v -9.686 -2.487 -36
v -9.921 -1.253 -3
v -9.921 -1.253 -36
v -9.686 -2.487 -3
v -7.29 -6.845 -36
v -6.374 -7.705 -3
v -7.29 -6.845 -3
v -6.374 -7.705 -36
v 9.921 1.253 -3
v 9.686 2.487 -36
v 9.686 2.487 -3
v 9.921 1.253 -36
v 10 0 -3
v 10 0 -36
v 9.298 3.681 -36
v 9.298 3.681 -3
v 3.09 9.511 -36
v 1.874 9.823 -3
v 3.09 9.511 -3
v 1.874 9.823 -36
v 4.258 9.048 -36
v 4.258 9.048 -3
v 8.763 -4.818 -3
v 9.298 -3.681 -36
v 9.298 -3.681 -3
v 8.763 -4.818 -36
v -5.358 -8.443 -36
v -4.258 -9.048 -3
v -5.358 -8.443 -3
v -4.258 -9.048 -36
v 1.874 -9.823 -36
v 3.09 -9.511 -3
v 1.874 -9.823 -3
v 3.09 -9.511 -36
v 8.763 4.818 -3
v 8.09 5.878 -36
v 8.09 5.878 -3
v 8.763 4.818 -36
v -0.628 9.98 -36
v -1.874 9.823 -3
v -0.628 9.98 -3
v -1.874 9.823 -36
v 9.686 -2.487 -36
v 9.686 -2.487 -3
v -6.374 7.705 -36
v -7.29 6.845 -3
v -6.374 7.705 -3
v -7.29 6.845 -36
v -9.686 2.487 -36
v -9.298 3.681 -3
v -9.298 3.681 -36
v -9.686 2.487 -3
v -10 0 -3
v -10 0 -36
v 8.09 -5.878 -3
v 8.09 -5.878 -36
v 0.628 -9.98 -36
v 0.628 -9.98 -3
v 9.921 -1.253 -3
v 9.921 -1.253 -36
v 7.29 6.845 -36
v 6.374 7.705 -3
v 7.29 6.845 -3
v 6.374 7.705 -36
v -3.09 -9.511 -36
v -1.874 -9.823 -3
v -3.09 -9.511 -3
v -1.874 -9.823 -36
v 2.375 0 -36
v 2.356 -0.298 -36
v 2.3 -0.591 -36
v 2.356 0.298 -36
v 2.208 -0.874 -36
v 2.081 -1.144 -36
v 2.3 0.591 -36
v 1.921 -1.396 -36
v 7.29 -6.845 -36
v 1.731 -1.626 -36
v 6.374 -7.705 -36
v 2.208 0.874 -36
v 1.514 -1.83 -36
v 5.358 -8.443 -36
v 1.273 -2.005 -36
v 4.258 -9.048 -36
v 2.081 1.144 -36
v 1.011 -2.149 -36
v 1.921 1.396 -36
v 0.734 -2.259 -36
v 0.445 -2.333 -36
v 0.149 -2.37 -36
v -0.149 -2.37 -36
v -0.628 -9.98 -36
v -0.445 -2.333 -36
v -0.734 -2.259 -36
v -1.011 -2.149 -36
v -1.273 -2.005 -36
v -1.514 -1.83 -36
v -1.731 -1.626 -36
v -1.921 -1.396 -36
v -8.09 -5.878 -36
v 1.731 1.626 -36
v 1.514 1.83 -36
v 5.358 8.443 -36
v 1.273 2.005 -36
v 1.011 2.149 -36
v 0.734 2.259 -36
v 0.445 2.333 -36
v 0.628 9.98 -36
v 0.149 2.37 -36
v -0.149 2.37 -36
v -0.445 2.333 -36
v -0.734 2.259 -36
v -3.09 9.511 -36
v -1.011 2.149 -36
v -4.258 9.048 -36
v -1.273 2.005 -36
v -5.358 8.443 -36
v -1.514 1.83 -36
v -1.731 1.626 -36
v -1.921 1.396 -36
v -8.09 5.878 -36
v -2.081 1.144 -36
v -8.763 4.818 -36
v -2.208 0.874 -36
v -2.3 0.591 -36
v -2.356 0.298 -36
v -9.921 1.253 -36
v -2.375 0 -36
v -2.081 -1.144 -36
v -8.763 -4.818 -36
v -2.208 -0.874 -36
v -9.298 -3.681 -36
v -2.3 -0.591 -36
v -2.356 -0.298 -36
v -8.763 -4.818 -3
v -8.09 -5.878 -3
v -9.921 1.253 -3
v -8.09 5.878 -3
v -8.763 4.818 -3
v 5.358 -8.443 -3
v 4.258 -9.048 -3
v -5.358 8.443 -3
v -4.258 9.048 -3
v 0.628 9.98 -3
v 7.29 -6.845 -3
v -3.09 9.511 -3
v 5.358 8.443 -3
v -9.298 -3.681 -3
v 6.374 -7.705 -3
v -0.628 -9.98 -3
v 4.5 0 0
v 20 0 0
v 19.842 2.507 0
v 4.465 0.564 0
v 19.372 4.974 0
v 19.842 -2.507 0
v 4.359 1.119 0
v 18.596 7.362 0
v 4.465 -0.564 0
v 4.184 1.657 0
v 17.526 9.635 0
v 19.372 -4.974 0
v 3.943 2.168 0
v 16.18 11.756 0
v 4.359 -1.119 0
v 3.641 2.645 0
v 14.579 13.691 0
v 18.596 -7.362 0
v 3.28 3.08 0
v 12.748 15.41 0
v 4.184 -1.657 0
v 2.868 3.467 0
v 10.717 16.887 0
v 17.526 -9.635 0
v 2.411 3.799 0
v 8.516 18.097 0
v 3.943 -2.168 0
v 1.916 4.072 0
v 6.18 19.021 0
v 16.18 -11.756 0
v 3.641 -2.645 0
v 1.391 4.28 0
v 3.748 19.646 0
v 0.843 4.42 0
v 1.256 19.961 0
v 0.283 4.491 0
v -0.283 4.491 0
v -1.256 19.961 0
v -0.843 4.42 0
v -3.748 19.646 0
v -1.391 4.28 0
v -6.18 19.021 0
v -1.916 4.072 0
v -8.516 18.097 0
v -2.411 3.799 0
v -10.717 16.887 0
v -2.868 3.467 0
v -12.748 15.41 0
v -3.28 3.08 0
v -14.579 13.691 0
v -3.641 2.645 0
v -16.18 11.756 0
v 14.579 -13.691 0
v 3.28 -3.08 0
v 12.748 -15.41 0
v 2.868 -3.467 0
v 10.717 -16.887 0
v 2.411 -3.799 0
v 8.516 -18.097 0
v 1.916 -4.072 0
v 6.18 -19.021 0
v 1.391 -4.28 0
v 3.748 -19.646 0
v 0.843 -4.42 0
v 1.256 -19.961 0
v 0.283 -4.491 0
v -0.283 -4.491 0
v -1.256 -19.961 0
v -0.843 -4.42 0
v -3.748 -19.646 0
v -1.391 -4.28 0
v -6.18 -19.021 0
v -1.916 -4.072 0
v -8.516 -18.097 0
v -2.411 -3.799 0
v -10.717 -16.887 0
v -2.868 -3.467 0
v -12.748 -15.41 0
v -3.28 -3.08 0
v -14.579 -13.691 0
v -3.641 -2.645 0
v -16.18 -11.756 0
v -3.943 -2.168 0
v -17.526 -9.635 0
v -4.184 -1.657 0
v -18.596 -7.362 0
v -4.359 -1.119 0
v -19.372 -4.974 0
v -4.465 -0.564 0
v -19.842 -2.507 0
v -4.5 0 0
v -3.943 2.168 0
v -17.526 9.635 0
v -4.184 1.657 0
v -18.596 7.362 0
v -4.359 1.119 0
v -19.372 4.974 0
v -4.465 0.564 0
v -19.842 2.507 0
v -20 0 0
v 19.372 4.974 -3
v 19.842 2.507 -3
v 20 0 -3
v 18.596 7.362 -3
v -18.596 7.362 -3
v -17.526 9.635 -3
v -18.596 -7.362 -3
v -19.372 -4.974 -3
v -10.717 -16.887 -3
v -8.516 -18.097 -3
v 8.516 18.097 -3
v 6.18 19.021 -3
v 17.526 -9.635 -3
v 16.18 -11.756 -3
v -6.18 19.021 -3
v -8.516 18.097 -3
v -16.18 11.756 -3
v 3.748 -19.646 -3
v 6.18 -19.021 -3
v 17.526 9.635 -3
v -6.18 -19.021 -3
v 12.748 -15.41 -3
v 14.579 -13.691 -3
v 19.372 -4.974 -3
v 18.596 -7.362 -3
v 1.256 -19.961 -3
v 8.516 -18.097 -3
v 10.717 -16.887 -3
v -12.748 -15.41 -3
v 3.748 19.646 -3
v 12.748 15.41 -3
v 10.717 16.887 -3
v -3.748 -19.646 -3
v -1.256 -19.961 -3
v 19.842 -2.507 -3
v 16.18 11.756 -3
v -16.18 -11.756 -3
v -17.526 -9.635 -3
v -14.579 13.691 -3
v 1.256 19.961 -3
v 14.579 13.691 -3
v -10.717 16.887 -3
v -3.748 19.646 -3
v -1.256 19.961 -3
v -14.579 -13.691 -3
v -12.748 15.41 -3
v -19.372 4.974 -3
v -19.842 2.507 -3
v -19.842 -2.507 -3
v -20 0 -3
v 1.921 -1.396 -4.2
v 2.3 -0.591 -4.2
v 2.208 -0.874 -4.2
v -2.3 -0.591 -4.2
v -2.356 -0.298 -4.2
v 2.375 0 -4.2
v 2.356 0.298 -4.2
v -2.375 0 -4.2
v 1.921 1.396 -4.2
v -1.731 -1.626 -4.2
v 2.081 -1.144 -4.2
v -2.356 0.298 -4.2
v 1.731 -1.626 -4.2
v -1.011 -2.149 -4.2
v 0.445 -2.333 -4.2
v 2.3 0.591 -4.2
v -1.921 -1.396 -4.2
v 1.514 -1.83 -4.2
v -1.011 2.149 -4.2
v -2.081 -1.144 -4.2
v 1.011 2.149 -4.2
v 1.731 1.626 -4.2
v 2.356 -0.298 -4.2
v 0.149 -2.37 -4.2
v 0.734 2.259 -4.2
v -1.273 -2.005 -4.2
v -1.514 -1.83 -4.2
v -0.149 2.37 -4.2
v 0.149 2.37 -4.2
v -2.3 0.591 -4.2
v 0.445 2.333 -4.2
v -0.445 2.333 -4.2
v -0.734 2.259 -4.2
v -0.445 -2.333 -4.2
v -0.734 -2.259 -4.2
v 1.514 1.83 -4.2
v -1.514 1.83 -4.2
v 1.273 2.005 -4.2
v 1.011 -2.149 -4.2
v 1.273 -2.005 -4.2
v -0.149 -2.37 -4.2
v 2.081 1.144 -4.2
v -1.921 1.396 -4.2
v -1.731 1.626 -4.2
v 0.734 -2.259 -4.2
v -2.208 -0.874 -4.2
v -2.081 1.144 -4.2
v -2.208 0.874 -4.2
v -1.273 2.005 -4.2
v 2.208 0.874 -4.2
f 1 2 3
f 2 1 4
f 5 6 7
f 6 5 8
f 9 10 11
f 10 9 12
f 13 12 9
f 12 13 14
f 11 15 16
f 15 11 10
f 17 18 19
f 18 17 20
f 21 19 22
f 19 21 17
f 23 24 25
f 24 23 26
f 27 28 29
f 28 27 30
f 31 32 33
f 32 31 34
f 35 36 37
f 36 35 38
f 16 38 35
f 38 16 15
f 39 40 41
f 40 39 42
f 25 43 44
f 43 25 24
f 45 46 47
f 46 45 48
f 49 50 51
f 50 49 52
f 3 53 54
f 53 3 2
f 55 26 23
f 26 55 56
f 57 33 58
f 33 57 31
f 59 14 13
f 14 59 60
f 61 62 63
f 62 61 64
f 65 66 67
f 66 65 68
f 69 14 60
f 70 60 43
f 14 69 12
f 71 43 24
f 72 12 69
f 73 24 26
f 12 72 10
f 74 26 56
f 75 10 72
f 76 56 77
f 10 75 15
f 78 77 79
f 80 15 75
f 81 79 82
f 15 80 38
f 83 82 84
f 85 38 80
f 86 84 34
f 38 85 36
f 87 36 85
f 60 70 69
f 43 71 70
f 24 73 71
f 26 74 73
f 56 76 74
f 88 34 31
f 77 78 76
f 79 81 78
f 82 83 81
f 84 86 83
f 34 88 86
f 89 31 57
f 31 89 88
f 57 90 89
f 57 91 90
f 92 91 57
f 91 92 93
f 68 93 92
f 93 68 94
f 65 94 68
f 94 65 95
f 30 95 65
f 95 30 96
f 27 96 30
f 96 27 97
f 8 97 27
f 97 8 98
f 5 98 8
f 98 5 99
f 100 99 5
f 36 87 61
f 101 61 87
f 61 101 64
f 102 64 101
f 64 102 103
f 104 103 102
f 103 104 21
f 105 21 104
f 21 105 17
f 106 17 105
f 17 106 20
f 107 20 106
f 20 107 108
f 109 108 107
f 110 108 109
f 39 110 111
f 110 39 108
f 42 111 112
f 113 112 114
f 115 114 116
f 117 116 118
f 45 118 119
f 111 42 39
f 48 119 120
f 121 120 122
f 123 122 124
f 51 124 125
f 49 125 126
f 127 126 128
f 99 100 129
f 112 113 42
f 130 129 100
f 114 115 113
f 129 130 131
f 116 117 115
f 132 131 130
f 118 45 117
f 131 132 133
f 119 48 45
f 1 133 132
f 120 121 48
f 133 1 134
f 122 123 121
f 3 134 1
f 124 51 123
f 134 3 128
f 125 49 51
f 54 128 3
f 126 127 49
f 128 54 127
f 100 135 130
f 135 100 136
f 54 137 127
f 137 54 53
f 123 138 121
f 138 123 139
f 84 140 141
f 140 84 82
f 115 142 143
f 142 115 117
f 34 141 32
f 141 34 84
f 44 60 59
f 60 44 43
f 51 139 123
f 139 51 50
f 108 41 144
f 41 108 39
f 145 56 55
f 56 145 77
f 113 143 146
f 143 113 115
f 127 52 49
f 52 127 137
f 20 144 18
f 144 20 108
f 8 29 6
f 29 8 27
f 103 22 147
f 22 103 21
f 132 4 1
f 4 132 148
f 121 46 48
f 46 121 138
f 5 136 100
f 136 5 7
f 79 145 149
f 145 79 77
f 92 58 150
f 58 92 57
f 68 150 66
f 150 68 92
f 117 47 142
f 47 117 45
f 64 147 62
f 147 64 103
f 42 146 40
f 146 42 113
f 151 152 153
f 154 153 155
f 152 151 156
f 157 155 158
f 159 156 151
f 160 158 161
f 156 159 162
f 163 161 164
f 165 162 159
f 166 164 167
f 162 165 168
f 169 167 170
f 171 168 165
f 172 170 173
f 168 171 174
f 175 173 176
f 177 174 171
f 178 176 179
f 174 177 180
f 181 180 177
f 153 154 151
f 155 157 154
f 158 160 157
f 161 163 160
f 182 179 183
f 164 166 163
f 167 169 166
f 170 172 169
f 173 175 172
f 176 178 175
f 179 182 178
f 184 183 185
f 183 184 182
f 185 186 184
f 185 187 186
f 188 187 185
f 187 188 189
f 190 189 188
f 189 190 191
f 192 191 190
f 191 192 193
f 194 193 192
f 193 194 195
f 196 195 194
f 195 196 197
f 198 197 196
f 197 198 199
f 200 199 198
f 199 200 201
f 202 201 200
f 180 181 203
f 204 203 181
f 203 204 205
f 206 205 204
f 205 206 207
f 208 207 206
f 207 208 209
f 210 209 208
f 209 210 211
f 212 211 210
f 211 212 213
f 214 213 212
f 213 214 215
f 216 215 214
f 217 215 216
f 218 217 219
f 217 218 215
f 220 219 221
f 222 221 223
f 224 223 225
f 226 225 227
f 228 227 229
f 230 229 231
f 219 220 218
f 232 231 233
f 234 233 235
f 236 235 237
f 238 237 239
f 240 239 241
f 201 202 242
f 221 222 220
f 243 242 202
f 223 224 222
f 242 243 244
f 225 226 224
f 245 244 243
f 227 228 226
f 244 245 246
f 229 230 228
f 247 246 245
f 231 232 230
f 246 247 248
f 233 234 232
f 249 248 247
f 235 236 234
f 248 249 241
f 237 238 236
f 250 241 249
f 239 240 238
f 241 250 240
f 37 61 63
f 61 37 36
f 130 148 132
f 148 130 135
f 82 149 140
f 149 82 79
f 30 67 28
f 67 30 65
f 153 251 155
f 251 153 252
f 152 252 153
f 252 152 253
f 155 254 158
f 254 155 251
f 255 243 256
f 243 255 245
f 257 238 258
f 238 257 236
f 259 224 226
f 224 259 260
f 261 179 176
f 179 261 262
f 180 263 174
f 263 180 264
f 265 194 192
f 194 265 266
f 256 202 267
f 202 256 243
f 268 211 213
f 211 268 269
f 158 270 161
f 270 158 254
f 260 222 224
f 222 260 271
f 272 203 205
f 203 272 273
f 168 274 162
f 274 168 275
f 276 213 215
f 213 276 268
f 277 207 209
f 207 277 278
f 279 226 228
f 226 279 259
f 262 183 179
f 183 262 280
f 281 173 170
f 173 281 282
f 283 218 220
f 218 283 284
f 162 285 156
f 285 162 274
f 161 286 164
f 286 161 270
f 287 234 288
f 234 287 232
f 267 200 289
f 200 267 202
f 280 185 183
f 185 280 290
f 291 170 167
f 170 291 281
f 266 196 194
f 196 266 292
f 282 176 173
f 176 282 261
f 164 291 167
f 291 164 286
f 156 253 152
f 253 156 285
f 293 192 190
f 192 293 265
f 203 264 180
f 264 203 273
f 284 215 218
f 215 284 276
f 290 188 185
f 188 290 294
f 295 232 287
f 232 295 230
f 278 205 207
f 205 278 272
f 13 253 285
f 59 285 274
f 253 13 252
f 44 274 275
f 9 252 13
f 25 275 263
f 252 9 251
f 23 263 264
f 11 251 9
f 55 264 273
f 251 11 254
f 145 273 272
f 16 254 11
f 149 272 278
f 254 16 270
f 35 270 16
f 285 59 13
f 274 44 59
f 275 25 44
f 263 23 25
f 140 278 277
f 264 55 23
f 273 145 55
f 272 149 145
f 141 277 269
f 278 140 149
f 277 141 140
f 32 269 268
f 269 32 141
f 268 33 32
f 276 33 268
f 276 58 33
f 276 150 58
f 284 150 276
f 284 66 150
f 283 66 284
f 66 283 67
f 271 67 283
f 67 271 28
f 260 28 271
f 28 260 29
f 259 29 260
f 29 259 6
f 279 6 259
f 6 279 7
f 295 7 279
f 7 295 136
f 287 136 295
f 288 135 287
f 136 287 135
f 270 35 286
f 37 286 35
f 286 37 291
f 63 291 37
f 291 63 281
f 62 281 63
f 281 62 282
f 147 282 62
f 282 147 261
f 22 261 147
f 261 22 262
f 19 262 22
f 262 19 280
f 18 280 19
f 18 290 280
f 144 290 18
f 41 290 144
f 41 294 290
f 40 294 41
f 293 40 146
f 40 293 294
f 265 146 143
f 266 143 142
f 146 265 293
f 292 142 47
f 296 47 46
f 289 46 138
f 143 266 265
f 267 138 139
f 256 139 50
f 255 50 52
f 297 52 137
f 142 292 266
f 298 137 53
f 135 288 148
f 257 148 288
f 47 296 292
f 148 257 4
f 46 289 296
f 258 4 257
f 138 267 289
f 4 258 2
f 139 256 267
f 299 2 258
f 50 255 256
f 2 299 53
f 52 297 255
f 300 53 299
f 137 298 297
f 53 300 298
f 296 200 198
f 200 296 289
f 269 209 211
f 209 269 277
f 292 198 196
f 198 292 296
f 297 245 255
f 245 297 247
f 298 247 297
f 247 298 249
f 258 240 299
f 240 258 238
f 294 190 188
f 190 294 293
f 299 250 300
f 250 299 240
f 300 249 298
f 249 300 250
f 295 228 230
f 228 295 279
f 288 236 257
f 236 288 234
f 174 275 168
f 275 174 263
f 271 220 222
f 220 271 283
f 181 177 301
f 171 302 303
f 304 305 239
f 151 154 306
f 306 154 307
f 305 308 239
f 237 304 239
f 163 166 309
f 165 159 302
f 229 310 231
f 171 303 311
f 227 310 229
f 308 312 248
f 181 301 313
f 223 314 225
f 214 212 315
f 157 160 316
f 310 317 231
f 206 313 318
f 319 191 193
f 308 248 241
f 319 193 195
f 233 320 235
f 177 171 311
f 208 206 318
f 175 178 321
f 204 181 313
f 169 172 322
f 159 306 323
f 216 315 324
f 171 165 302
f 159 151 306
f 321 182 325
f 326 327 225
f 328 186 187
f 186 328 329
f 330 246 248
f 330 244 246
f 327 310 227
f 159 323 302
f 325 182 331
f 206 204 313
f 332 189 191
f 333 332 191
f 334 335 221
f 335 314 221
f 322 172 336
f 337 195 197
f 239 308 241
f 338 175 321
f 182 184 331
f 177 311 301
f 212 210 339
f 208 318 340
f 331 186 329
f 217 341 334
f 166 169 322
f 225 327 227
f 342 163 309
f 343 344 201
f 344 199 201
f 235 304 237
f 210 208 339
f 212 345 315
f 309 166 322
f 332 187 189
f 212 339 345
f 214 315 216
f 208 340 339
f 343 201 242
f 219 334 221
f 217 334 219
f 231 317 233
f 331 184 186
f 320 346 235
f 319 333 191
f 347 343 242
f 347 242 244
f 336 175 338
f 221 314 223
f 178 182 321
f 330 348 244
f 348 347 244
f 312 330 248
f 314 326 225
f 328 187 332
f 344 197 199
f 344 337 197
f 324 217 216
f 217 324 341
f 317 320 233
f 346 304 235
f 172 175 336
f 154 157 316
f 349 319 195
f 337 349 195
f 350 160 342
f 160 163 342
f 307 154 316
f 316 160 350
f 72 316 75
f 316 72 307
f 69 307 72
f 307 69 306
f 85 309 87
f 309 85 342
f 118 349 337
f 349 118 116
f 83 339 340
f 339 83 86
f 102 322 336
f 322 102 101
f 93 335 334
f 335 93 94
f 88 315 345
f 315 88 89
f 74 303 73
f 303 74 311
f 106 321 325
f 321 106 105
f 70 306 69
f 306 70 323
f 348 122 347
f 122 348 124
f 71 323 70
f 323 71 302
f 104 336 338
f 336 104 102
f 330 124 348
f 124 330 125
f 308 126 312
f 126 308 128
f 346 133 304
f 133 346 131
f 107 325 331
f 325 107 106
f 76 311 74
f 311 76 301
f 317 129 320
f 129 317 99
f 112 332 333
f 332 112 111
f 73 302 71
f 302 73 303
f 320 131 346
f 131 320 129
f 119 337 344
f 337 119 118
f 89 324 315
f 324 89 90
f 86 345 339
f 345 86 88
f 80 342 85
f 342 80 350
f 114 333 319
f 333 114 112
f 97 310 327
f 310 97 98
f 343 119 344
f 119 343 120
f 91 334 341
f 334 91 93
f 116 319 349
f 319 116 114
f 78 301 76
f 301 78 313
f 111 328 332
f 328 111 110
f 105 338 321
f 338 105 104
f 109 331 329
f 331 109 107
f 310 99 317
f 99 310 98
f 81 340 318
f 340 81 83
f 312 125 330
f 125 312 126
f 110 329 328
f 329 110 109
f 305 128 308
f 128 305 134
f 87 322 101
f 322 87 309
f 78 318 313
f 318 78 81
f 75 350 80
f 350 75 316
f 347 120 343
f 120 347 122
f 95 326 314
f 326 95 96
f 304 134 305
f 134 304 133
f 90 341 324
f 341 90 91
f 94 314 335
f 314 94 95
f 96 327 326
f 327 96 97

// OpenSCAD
$fn = 50;


difference() {
	union() {
		translate(v = [0, 0, -36.0000000000]) {
			cylinder(h = 36, r = 10.0000000000);
		}
		translate(v = [0, 0, -3.0000000000]) {
			cylinder(h = 3, r = 20.0000000000);
		}
	}
	union() {
		translate(v = [0, 0, 0]) {
			rotate(a = [0, 0, 0]) {
				difference() {
					union() {
						#translate(v = [0, 0, -36.0000000000]) {
							cylinder(h = 36, r = 2.2500000000);
						}
						#translate(v = [0, 0, -4.2000000000]) {
							cylinder(h = 4.2000000000, r1 = 2.3750000000, r2 = 4.5000000000);
						}
						#translate(v = [0, 0, -36.0000000000]) {
							cylinder(h = 36, r = 2.3750000000);
						}
						#translate(v = [0, 0, -36.0000000000]) {
							cylinder(h = 36, r = 2.2500000000);
						}
					}
					union();
				}
			}
		}
	}
}
